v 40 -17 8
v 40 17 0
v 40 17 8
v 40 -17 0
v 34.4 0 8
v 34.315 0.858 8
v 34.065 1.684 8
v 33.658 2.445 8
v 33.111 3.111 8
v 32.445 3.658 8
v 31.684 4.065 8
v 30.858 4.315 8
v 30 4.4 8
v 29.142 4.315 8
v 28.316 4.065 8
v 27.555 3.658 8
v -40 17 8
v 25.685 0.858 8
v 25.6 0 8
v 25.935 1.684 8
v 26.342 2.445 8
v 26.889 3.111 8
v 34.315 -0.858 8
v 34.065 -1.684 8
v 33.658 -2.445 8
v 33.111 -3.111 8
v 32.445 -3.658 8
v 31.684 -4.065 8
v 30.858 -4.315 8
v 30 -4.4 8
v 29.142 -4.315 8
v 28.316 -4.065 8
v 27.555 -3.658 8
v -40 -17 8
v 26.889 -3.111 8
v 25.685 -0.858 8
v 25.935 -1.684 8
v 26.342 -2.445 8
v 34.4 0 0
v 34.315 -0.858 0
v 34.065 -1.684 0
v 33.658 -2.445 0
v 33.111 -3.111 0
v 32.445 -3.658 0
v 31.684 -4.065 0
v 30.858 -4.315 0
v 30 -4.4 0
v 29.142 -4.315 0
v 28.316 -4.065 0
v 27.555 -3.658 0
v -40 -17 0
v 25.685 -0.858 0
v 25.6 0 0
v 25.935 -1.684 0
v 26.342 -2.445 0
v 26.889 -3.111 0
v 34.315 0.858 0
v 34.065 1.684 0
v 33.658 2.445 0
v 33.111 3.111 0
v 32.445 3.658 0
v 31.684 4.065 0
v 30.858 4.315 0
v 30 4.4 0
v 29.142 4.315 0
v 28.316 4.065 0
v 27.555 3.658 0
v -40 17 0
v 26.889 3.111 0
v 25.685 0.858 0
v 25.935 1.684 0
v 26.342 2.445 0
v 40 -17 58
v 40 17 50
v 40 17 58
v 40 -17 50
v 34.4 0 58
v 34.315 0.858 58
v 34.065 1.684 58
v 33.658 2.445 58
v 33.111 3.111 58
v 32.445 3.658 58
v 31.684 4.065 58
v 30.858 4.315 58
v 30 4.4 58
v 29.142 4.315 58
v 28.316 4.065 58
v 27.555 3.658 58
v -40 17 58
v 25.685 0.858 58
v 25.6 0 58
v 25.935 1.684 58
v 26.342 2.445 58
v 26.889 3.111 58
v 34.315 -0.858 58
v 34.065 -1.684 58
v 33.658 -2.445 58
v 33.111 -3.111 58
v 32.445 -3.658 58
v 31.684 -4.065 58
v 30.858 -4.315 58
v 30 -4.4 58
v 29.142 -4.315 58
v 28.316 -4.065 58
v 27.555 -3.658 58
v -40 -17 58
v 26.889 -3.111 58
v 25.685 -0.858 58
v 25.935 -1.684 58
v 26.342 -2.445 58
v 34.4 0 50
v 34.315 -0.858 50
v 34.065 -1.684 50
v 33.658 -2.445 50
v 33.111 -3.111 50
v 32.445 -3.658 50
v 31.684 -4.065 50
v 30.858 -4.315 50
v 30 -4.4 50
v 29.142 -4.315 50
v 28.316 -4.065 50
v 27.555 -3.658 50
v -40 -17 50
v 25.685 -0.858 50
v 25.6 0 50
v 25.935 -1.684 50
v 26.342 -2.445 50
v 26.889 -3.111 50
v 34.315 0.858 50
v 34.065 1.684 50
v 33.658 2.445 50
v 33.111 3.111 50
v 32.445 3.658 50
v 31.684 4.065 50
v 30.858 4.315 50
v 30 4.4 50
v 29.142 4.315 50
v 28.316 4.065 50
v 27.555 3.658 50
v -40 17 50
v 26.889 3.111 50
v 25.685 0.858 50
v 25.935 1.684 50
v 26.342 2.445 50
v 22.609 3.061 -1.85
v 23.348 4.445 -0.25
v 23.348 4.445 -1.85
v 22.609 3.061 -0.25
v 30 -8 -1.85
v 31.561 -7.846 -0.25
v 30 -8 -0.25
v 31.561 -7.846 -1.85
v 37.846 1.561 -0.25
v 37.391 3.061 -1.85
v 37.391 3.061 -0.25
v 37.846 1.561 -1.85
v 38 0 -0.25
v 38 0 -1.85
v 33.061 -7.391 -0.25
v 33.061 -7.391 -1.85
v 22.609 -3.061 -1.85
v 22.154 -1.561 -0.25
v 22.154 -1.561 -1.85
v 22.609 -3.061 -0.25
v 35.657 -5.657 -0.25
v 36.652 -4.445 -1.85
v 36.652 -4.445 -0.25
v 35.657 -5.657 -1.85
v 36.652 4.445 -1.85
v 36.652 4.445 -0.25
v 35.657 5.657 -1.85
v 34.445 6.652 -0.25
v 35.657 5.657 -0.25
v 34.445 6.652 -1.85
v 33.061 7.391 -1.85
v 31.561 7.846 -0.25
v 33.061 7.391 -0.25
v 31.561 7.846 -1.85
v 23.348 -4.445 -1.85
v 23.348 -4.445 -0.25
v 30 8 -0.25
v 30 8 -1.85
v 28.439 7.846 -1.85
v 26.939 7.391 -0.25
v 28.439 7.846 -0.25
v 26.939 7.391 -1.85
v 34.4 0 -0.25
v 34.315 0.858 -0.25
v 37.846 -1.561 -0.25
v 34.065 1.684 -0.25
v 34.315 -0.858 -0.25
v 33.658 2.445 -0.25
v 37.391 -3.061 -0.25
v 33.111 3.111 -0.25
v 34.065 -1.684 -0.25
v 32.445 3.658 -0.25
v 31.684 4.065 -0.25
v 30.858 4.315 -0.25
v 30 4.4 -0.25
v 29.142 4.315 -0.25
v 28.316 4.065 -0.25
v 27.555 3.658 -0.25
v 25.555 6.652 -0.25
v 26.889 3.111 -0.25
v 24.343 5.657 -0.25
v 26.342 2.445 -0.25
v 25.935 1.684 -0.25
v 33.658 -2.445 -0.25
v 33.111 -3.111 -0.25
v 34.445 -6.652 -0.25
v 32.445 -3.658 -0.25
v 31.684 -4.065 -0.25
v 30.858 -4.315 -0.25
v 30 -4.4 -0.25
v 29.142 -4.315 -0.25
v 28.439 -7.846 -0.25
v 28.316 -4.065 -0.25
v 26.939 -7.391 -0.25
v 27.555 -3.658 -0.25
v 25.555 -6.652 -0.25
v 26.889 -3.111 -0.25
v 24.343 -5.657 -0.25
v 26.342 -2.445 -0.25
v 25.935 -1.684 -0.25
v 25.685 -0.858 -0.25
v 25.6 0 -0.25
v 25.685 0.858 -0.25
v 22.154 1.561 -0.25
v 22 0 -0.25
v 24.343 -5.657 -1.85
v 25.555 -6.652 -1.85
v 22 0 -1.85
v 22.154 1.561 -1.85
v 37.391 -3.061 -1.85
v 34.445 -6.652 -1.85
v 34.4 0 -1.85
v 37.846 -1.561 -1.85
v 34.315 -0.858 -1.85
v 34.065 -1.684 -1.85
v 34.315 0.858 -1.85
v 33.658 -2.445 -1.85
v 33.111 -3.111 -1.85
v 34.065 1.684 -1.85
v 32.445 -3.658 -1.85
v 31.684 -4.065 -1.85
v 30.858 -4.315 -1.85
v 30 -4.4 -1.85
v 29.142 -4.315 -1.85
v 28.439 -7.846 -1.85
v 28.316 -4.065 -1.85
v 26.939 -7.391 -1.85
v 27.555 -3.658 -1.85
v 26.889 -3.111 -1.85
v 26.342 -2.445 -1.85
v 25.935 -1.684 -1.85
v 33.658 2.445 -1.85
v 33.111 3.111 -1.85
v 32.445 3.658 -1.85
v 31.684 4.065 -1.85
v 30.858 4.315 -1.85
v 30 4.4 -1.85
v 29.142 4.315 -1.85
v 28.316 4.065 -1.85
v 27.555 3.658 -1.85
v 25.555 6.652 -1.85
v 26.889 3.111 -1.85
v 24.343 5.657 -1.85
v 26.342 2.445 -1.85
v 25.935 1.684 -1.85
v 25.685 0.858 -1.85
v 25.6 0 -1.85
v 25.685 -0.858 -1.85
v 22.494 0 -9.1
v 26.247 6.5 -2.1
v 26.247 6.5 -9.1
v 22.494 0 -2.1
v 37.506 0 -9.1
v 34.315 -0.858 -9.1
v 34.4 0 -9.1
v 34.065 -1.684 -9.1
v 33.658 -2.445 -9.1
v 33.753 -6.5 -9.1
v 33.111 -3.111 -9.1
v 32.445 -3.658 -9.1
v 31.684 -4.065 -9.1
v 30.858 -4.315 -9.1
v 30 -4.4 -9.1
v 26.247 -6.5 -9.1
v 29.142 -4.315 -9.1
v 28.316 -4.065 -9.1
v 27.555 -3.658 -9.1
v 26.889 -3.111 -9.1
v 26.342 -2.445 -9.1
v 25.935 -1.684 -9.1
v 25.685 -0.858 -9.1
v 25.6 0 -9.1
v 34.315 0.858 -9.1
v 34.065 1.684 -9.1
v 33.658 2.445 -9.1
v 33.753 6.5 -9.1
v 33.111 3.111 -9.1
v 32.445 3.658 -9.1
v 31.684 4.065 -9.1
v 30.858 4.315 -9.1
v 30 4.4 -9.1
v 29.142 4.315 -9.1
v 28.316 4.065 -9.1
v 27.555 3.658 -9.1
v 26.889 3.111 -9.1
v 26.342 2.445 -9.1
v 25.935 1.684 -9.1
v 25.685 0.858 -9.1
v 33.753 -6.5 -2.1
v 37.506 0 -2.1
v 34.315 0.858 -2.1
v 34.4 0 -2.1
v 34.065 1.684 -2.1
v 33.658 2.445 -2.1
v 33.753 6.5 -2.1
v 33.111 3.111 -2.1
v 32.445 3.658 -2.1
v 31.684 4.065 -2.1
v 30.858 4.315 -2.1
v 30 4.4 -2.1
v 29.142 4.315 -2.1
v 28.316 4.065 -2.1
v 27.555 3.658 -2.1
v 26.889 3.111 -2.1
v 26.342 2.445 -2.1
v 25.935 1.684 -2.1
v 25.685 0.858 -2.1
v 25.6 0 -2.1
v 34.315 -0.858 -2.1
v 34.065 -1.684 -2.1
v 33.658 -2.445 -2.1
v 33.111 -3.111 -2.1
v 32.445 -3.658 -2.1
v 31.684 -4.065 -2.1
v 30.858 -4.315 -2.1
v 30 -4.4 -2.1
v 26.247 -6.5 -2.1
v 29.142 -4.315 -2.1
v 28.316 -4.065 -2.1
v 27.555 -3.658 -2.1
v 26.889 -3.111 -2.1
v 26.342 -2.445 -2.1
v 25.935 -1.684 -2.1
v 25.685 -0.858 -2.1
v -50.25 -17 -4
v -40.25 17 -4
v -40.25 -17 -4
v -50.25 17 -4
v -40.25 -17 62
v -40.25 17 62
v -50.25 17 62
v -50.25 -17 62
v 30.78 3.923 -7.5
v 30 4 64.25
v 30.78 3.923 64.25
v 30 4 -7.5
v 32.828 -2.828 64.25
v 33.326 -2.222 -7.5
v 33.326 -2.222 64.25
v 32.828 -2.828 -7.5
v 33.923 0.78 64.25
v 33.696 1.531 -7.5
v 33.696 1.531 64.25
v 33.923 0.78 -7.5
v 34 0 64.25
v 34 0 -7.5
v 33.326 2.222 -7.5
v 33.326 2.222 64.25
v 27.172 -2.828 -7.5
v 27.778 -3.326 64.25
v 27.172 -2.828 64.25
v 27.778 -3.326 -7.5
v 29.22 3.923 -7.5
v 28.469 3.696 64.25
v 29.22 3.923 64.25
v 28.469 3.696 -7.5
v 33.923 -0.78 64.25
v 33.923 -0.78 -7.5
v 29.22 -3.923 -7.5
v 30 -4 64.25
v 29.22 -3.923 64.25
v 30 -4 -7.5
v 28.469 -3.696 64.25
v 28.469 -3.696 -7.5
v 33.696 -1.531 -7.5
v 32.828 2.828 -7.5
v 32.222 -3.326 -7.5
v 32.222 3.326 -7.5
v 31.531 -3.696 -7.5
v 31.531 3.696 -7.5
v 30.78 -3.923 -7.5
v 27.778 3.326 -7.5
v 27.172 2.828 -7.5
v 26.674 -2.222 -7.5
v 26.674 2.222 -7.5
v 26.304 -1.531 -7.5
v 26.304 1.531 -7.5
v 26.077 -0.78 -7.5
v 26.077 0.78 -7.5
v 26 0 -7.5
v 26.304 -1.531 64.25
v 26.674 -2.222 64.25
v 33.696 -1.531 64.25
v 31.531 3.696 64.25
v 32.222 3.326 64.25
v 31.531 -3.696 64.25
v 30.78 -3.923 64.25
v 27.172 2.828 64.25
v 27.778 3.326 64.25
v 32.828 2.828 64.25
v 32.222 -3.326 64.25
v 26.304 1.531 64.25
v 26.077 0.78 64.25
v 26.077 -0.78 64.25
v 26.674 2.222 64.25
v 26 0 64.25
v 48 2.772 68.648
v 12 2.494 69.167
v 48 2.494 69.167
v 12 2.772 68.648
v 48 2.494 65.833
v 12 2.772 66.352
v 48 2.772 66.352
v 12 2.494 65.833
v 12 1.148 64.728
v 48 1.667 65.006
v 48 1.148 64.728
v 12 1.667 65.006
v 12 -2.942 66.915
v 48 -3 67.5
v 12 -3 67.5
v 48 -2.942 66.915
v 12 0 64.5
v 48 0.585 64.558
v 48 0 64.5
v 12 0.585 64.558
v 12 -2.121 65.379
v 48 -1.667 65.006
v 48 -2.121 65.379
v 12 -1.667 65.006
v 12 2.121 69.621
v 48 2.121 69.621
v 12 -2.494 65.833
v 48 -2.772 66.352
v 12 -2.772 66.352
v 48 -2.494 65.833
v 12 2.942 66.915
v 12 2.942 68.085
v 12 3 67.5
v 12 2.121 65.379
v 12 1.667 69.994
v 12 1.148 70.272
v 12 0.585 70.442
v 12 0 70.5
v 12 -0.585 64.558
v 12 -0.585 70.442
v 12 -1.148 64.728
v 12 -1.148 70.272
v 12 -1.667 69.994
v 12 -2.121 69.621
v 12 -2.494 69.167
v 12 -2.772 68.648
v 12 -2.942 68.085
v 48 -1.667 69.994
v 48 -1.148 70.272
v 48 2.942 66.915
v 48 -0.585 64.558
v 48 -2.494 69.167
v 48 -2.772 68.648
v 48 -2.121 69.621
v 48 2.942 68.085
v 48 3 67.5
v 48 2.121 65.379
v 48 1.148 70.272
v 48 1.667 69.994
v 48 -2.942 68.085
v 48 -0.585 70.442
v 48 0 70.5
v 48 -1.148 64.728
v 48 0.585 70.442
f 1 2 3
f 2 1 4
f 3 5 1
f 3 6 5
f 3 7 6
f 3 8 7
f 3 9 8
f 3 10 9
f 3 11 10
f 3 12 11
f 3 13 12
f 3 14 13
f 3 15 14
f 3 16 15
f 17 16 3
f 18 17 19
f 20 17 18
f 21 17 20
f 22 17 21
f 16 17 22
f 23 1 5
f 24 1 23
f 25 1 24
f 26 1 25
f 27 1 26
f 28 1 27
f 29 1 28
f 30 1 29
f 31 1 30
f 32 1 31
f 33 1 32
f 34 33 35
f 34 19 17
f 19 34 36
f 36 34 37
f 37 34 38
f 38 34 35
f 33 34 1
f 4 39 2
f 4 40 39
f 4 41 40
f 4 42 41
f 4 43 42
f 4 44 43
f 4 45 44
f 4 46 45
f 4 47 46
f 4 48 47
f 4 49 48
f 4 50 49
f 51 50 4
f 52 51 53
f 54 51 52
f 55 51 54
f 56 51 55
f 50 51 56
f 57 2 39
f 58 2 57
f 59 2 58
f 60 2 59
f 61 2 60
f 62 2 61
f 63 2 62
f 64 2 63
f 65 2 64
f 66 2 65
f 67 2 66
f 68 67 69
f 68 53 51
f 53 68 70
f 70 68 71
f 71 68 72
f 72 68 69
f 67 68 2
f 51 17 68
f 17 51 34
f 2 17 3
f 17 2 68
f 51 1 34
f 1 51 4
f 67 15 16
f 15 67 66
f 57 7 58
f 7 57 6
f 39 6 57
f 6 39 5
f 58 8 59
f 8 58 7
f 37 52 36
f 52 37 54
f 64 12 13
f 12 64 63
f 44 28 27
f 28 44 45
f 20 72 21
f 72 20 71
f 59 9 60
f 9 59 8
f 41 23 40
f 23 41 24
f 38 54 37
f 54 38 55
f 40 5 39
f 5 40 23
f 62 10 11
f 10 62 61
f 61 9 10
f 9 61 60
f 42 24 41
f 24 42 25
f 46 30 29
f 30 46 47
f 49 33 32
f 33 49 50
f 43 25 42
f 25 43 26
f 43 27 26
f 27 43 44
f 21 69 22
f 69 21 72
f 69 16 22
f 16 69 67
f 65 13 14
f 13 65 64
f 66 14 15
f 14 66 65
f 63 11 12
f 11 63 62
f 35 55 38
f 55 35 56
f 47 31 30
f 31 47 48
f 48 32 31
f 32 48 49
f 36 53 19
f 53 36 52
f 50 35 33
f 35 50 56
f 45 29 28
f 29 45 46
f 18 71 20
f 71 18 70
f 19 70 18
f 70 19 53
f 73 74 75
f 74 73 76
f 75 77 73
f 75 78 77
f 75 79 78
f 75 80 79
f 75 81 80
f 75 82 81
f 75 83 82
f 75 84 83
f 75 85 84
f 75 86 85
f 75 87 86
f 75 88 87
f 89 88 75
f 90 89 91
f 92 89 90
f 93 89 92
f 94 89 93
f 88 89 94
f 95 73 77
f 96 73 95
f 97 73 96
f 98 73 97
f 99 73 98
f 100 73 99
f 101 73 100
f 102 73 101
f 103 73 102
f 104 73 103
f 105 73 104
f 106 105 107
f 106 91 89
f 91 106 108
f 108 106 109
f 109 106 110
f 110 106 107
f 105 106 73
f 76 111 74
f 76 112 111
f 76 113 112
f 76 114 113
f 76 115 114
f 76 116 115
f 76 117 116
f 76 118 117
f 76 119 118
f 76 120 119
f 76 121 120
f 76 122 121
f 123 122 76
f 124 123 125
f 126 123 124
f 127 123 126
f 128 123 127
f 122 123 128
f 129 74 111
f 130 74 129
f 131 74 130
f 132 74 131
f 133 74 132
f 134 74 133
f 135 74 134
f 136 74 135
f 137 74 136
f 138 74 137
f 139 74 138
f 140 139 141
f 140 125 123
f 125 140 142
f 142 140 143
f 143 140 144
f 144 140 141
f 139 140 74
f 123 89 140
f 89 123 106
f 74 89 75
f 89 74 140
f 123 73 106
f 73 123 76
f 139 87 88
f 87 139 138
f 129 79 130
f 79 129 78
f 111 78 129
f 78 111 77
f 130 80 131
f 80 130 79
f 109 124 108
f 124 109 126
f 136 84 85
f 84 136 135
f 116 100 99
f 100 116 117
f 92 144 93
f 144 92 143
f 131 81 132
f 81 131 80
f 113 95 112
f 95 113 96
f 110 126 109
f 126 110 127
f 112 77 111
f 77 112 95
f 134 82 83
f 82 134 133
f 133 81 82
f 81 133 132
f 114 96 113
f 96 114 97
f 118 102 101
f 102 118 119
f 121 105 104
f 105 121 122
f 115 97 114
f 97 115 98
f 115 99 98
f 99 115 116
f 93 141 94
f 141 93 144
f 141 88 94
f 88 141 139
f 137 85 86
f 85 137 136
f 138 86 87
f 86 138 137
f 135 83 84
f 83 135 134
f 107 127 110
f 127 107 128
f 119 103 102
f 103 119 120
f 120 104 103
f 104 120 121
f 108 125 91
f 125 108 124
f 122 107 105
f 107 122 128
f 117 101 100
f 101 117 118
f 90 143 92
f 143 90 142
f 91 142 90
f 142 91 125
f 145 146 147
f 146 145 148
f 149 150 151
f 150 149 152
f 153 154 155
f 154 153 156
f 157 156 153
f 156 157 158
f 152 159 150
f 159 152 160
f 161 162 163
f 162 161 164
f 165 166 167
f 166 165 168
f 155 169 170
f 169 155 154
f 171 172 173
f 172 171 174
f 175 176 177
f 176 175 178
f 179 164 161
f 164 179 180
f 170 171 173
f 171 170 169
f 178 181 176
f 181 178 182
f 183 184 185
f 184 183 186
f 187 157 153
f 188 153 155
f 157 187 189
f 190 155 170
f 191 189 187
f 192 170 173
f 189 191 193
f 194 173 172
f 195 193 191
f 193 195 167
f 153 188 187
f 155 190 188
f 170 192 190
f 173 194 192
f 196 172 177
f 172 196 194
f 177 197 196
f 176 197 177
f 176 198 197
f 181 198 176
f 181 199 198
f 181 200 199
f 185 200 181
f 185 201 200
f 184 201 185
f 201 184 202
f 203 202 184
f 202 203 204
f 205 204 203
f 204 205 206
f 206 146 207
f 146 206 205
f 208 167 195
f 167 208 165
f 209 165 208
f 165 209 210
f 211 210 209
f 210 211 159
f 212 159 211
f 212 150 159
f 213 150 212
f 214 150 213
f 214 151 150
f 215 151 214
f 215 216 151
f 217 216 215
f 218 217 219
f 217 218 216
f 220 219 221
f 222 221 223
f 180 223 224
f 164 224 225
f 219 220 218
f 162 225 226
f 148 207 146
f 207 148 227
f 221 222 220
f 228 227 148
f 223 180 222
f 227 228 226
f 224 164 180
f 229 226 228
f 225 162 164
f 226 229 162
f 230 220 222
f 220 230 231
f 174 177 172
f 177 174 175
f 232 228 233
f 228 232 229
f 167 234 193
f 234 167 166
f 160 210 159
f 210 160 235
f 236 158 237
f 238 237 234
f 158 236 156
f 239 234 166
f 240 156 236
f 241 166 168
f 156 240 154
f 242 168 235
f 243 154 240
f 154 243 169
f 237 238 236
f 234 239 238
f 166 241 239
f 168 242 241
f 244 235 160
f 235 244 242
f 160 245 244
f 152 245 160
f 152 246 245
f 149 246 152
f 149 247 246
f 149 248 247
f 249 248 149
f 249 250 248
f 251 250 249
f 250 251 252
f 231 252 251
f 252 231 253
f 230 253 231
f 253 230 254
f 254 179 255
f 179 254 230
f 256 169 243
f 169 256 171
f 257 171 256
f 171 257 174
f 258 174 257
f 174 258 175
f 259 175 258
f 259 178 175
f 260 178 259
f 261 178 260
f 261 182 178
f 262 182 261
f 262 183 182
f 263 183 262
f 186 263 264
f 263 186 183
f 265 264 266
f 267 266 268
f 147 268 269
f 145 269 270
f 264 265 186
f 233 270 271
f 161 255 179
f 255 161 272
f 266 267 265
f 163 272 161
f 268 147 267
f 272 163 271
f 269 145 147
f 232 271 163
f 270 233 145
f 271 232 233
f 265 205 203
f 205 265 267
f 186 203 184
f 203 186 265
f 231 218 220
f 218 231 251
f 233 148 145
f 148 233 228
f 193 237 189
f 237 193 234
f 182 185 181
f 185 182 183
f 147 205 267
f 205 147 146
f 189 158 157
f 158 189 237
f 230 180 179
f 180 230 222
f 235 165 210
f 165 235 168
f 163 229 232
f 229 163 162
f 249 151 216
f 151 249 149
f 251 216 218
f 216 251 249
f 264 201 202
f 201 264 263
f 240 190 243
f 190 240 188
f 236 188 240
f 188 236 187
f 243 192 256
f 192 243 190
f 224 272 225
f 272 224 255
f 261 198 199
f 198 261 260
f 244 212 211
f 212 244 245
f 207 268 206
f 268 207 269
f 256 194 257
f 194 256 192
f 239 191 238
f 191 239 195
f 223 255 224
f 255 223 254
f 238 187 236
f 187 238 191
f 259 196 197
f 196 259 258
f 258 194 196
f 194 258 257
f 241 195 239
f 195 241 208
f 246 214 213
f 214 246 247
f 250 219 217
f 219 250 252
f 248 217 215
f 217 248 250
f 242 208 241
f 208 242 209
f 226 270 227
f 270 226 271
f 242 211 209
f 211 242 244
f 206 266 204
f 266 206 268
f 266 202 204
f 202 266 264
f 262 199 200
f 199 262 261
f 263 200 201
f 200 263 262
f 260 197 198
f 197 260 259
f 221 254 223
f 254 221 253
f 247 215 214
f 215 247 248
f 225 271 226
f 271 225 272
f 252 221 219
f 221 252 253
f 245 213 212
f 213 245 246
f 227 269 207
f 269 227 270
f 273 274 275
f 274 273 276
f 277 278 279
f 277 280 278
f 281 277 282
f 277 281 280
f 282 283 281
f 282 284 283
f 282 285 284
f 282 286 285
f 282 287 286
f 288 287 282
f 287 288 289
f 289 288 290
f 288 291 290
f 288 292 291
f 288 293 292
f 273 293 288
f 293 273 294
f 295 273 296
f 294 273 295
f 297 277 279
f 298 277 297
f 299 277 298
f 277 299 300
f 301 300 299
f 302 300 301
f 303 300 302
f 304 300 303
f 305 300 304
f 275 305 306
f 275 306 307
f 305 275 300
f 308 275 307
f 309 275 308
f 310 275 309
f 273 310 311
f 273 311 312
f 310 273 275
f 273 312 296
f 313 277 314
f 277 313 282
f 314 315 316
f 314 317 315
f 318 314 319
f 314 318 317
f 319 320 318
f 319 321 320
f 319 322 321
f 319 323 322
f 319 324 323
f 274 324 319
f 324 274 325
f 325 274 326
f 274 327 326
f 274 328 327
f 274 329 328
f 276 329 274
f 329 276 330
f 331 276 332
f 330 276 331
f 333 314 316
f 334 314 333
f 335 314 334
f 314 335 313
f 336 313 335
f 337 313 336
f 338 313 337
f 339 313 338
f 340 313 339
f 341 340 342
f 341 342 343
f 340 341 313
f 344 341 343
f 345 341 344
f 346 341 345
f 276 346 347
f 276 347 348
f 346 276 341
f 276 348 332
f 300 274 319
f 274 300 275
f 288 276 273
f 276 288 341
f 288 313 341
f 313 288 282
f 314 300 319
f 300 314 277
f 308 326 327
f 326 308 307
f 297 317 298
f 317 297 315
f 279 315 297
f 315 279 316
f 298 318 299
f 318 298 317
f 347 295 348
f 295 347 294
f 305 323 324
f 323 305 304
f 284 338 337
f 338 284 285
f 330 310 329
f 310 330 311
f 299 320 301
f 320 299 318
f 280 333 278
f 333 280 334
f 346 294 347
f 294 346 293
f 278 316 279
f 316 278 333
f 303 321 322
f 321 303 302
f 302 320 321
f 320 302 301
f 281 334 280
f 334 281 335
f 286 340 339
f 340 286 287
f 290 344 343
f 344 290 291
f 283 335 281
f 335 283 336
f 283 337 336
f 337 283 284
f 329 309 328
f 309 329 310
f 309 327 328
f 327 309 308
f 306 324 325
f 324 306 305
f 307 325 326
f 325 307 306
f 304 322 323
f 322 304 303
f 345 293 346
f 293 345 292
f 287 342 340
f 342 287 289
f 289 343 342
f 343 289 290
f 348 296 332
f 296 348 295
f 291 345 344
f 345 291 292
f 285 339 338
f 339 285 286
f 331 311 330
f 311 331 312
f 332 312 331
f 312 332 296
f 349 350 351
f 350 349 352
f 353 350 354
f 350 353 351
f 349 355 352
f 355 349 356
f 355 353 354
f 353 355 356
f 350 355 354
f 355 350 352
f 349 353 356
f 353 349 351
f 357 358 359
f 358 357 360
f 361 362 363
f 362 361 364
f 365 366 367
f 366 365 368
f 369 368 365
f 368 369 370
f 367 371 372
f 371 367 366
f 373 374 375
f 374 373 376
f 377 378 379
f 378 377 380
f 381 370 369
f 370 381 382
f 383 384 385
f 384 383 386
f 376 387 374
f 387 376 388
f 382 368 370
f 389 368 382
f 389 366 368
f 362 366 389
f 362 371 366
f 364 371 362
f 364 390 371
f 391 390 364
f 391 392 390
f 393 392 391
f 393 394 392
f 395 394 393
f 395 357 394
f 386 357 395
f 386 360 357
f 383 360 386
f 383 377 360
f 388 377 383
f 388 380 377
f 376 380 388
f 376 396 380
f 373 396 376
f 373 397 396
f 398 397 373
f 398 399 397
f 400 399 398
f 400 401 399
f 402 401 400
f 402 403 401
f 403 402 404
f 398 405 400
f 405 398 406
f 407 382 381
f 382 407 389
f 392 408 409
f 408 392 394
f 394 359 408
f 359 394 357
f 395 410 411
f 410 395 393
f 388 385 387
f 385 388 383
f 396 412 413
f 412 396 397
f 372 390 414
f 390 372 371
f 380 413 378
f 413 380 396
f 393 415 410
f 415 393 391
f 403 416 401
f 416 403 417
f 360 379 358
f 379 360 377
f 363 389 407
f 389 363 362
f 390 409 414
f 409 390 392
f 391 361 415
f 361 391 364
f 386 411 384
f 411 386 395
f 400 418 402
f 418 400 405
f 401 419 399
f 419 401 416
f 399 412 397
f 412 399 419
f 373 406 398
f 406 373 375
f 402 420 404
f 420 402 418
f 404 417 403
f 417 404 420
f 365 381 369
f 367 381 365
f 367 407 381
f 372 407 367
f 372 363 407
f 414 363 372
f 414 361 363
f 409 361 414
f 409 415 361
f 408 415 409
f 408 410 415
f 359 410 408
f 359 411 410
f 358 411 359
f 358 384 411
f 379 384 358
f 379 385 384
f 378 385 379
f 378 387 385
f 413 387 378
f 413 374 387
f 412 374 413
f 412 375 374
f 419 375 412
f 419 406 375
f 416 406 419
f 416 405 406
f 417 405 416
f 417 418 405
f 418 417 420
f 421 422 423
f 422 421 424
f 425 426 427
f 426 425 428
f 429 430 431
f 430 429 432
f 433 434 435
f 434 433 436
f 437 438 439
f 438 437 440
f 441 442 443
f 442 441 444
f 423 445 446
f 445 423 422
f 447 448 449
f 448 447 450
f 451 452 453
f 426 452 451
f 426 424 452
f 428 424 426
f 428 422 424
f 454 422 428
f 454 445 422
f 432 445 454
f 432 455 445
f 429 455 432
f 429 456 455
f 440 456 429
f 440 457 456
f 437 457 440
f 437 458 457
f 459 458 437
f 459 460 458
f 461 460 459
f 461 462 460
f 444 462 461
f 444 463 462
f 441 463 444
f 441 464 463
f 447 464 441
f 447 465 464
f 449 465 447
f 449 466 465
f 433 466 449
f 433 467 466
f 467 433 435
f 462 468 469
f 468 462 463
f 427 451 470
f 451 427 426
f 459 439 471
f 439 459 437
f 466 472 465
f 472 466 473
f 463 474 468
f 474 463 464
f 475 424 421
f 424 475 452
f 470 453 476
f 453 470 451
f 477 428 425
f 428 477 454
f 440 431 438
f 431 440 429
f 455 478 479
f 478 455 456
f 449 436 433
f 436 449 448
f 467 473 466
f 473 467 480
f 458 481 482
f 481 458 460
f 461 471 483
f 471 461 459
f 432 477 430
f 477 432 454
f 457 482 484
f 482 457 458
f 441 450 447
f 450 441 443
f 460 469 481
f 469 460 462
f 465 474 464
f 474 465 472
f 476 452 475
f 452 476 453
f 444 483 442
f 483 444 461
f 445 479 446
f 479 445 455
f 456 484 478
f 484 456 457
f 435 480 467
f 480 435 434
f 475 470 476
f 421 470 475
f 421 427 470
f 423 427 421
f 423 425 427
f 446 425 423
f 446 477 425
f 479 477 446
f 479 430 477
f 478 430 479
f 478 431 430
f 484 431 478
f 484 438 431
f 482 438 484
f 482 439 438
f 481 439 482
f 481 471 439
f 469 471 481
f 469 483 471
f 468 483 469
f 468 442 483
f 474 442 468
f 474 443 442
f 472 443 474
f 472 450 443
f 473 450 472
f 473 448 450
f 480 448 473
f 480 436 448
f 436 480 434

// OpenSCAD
$fn = 32;

// ------------------------------------------------------------------------
// C clamp: throat 50 mm, screw d8
// Every part is its own module, assembly() places every instance.
// ------------------------------------------------------------------------

// --- part 1 ---
module clamp_arm() {
  difference() {
    translate([-40, -17, 0]) cube([80, 34, 8]);
    translate([30, 0, -1]) cylinder(h = 10, d = 8.8);
  }
}

// --- part 2 ---
module clamp_spine() {
  difference() {
    translate([-33, -17, 0]) cube([66, 34, 10]);
  }
}

// --- part 3 ---
module clamp_screw() {
  translate([0, 0, -35.875]) cylinder(h = 71.75, d = 8);
}

// --- part 4 ---
module clamp_washer() {
  difference() {
      translate([0, 0, 0]) cylinder(h = 1.6, d = 16);
      translate([0, 0, -1]) cylinder(h = 3.6, d = 8.8);
    }
}

// --- part 5 ---
module clamp_nut() {
  difference() {
    linear_extrude(height = 7) polygon(points = [[7.506, 0], [3.753, 6.5], [-3.753, 6.5], [-7.506, 0], [-3.753, -6.5], [3.753, -6.5]]);
    translate([0, 0, -1]) cylinder(h = 9, d = 8.8);
  }
}

// --- part 6 ---
module tommy_bar() {
  translate([0, 0, -18]) cylinder(h = 36, d = 6);
}

// --- assembly ---
module assembly() {
  color([0.80, 0.24, 0.20]) translate([0, 0, 0]) rotate([0, 0, 0]) clamp_arm();
  color([0.20, 0.45, 0.75]) translate([0, 0, 50]) rotate([0, 0, 0]) clamp_arm();
  color([0.25, 0.62, 0.32]) translate([-50.25, 0, 29]) rotate([0, 90, 0]) clamp_spine();
  color([0.92, 0.70, 0.18]) translate([30, 0, 28.375]) rotate([0, 0, 0]) clamp_screw();
  color([0.58, 0.35, 0.70]) translate([30, 0, -1.85]) rotate([0, 0, 0]) clamp_washer();
  color([0.16, 0.66, 0.66]) translate([30, 0, -9.1]) rotate([0, 0, 0]) clamp_nut();
  color([0.85, 0.48, 0.18]) translate([30, 0, 67.5]) rotate([0, 90, 0]) tommy_bar();
}

assembly();
